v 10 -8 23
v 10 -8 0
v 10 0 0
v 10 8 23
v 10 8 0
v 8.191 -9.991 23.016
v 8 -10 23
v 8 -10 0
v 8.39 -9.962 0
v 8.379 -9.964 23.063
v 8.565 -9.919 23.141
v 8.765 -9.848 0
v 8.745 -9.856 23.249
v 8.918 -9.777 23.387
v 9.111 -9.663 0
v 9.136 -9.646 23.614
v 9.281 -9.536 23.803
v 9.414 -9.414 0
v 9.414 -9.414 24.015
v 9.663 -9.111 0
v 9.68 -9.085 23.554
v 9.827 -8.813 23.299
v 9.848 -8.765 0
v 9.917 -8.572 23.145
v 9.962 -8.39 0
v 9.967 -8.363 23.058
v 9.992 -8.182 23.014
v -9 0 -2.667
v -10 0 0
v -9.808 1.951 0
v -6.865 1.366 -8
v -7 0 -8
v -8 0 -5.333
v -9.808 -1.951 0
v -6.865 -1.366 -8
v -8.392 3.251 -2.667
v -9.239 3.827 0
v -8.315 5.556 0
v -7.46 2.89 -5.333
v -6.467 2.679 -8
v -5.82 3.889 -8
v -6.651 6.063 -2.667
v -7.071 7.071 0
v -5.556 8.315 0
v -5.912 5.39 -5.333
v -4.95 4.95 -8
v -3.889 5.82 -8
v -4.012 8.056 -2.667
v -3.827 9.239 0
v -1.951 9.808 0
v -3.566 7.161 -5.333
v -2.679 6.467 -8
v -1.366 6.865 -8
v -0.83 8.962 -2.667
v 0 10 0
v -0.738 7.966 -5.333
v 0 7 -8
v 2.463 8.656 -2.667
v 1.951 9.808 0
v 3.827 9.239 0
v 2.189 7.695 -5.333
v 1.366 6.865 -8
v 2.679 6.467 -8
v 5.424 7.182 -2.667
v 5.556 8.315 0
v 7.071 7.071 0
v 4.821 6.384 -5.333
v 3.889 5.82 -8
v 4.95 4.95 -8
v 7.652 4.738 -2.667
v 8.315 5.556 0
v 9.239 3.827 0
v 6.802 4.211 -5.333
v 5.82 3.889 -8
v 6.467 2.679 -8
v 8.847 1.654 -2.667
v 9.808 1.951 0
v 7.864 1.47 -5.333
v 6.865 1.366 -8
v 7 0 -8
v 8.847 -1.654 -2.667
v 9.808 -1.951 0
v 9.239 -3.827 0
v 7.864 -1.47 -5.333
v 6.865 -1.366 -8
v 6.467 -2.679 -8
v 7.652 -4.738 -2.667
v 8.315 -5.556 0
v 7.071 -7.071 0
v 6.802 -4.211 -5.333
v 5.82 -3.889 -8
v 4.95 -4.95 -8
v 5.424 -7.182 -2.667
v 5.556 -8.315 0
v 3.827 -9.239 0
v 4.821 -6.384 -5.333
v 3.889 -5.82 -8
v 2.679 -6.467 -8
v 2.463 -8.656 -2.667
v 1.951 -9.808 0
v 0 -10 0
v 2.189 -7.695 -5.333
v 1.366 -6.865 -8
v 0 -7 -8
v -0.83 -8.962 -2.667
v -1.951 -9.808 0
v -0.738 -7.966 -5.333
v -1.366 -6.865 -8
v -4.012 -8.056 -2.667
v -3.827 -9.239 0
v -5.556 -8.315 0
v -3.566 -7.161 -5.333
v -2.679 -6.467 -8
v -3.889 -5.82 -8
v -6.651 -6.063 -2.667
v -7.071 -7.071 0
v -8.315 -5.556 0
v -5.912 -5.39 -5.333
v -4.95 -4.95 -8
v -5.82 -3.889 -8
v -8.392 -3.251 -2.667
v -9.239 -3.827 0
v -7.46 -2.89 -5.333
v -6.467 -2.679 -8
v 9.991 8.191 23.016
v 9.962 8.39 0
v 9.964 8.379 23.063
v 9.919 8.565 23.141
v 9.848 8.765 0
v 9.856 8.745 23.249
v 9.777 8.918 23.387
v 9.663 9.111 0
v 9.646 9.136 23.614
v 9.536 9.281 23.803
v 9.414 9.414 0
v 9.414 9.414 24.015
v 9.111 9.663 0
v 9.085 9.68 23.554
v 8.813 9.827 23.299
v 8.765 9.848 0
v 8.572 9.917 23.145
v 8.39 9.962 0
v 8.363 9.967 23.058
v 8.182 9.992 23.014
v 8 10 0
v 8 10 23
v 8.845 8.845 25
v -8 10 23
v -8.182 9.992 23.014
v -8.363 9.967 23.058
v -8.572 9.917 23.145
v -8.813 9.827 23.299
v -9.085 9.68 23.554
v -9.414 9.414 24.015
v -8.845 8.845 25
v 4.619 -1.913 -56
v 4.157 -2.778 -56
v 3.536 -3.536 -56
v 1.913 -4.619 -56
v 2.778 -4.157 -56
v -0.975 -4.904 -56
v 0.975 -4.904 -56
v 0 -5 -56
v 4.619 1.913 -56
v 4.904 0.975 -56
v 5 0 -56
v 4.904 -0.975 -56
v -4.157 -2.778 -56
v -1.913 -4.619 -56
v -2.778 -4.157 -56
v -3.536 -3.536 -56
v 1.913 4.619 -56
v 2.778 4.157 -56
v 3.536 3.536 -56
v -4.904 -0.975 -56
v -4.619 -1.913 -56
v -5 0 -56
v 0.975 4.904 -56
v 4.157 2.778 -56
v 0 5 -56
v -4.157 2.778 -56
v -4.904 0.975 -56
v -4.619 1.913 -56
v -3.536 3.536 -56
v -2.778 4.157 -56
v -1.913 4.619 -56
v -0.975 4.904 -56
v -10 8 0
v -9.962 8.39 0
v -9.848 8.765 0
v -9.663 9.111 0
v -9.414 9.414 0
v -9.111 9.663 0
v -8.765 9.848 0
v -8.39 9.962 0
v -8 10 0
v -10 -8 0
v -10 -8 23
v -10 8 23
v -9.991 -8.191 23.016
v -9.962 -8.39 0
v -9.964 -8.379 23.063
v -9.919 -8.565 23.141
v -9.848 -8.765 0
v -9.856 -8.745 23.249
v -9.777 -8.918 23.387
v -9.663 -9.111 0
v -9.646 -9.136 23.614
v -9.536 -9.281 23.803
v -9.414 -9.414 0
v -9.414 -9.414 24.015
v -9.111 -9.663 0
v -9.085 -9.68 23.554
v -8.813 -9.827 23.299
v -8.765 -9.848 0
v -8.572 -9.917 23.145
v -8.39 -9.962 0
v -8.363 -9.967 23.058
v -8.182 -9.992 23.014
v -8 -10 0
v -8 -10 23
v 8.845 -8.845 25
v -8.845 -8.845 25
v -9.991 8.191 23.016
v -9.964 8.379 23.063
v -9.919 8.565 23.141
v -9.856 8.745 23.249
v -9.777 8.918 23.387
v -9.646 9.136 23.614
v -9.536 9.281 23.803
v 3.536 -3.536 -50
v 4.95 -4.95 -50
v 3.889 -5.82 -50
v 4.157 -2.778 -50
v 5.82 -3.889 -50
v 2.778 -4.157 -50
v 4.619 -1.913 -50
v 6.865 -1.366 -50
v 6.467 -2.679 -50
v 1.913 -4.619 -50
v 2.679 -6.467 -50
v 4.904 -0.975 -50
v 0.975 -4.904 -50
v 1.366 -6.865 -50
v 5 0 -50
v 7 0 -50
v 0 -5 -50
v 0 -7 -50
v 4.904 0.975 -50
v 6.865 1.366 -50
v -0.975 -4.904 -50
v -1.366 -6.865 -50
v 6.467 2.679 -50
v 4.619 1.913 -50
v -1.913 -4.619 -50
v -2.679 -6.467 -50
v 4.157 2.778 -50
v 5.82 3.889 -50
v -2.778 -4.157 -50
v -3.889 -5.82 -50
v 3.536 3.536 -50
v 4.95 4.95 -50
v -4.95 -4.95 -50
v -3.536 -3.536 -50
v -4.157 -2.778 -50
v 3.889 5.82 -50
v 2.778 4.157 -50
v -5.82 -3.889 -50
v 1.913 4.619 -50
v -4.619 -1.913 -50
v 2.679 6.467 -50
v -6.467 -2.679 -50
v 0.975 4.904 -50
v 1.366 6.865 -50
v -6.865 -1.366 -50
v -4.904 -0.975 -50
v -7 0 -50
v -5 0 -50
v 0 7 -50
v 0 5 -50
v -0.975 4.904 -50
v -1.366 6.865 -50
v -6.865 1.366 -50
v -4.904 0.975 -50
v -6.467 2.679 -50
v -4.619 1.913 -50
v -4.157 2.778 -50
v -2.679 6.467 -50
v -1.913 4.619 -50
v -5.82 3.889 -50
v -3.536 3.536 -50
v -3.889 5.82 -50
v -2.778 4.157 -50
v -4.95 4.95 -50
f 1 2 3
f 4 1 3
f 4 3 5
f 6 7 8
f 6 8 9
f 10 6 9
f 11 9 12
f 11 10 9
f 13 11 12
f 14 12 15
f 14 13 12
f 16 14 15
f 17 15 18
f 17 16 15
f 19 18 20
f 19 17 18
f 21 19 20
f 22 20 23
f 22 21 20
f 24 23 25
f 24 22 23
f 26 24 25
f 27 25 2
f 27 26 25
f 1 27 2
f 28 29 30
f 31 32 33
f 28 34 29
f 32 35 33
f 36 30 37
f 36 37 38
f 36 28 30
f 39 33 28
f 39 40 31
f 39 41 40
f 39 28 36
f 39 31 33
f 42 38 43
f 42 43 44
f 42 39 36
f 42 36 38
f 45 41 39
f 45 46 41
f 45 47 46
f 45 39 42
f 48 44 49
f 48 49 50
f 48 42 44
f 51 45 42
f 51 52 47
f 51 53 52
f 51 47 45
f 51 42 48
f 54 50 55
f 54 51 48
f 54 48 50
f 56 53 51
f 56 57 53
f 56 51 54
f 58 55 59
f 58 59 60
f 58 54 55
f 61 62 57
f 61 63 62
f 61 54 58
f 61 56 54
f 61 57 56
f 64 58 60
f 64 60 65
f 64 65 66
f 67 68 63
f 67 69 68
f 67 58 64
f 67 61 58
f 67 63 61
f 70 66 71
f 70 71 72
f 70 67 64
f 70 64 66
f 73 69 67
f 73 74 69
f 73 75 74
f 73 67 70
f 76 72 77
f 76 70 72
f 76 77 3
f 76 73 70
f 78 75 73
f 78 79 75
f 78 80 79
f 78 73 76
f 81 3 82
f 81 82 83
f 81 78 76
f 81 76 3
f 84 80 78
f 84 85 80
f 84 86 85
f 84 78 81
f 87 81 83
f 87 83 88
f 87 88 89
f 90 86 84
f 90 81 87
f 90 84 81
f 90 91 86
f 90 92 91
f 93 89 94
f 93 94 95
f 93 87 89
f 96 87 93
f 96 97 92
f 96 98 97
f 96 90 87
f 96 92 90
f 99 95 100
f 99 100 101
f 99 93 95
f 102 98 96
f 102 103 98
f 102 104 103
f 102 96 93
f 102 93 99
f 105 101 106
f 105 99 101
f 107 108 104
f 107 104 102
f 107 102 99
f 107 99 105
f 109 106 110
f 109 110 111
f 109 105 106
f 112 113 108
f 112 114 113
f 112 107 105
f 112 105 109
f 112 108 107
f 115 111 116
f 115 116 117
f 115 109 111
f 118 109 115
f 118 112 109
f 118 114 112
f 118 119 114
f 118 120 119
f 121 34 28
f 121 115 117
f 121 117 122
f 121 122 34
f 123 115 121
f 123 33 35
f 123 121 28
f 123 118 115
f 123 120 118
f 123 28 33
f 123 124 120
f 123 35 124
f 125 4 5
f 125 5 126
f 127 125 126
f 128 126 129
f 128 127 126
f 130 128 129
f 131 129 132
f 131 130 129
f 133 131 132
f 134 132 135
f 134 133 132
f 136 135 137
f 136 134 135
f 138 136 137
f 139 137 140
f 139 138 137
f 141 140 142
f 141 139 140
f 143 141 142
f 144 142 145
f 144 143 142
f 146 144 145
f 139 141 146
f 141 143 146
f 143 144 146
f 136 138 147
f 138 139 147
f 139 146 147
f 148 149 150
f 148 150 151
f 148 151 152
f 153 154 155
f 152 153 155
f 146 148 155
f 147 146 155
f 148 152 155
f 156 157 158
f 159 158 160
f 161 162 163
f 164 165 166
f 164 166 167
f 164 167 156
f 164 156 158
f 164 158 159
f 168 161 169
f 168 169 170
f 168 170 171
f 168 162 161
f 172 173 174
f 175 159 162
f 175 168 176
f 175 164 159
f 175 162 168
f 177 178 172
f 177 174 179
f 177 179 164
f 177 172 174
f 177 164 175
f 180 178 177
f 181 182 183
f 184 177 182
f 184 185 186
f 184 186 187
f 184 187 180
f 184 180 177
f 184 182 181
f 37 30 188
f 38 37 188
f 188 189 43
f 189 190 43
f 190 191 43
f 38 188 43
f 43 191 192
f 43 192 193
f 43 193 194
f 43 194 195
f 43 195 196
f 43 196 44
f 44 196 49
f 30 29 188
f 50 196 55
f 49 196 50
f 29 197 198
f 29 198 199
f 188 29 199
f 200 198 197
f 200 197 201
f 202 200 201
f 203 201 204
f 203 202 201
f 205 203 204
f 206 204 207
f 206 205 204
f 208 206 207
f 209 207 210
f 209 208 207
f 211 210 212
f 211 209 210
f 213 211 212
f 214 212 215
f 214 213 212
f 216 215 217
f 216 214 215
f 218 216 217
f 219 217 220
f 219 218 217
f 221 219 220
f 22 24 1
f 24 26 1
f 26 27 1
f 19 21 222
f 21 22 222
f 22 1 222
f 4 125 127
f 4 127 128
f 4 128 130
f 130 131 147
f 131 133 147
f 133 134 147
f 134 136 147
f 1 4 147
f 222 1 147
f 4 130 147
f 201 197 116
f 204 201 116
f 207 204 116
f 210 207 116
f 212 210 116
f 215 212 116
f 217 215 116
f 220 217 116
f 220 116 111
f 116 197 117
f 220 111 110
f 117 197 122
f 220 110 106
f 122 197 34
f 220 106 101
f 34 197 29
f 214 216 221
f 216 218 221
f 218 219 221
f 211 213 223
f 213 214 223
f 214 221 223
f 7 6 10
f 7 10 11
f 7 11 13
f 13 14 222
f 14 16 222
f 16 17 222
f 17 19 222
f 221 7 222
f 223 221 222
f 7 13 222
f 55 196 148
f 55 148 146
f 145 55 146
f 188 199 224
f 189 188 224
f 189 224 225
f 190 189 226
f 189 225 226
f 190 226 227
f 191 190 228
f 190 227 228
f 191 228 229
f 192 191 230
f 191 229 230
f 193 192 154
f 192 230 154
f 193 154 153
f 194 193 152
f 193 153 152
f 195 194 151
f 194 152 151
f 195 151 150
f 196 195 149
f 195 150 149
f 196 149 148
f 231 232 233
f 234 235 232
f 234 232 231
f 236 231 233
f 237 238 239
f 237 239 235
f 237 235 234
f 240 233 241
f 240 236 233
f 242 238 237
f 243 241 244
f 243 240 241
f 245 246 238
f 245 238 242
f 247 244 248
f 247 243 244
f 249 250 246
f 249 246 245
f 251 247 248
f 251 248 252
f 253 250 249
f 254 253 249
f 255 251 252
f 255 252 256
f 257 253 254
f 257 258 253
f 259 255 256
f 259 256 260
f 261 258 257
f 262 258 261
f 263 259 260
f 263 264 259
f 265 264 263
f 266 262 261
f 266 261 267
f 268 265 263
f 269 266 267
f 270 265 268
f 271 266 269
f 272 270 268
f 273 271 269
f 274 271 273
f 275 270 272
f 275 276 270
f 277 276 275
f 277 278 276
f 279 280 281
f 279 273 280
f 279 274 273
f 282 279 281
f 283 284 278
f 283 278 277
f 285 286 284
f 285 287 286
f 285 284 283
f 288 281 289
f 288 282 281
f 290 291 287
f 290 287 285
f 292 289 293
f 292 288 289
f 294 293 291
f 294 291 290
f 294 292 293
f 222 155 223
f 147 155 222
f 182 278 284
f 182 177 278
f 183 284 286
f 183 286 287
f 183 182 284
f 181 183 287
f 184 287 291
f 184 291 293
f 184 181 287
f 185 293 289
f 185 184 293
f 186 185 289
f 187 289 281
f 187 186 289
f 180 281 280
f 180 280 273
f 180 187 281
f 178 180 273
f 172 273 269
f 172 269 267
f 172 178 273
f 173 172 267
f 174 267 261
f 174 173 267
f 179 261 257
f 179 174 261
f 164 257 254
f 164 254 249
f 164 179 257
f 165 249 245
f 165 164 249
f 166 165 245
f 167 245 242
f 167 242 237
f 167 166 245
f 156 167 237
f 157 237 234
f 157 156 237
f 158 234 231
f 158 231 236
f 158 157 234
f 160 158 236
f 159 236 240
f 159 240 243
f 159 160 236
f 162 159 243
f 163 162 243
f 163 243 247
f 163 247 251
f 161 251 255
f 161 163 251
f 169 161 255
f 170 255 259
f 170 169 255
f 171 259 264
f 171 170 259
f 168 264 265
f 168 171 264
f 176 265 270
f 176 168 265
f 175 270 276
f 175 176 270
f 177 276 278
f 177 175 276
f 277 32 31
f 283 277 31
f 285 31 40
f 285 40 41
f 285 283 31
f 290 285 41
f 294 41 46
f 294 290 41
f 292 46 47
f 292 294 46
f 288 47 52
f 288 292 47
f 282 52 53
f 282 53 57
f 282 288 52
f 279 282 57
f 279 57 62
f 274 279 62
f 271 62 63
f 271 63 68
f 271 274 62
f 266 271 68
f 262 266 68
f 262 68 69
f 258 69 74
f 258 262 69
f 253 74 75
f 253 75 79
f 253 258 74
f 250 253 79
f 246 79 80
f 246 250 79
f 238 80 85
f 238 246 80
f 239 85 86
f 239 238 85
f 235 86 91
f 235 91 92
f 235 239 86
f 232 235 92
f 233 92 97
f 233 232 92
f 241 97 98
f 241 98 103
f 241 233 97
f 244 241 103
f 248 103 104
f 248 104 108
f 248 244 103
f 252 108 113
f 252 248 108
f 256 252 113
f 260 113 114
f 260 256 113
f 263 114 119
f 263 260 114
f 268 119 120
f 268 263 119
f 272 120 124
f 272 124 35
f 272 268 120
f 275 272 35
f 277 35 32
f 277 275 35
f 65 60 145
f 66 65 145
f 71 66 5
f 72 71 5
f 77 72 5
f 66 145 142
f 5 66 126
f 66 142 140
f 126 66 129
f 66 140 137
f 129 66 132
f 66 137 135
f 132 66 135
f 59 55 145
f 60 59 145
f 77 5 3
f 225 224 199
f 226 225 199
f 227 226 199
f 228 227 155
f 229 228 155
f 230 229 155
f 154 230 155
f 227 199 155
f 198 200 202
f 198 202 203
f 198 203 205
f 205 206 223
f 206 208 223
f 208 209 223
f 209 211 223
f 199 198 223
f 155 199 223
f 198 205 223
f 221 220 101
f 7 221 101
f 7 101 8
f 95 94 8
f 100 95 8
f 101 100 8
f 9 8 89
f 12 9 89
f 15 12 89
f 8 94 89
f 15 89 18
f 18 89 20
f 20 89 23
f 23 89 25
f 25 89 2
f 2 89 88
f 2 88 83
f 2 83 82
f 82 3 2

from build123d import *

# Parameters (mm, degrees)
F0_W     = 20
F0_H     = 20
F1_DEPTH = 23
F2_W     = 20
F2_H     = 20
F3_DEPTH = 2
F3_TAPER = 30
F6_R     = 2


with BuildPart() as f1:
    # F0 (on Top) → F1 (new body)
    with BuildSketch(Plane.XY):
        Rectangle(F0_W, F0_H)
    extrude(amount=F1_DEPTH)

    # F2 (on face) → F3 (join)
    with BuildSketch(Plane.XY.offset(23)):
        Rectangle(F2_W, F2_H)
    extrude(amount=F3_DEPTH, taper=F3_TAPER)

    # F4 (on Front) → F5 (revolve)
    with BuildSketch(Plane.XZ):
        Polygon((0, -56), (0, 0), (-10, 0), (-7, -8), (-7, -50), (-5, -50), (-5, -56), align=None)
    revolve(axis=Axis((0, 0, -28), (0, 0, -1)))

    # F6
    f6_edges = [f1.edges().sort_by_distance(p)[0] for p in [
        (-10, 10, 11.5),
        (-10, -10, 11.5),
        (10, -10, 11.5),
        (10, 10, 11.5),
    ]]
    fillet(f6_edges, radius=F6_R)


solid = f1.part
